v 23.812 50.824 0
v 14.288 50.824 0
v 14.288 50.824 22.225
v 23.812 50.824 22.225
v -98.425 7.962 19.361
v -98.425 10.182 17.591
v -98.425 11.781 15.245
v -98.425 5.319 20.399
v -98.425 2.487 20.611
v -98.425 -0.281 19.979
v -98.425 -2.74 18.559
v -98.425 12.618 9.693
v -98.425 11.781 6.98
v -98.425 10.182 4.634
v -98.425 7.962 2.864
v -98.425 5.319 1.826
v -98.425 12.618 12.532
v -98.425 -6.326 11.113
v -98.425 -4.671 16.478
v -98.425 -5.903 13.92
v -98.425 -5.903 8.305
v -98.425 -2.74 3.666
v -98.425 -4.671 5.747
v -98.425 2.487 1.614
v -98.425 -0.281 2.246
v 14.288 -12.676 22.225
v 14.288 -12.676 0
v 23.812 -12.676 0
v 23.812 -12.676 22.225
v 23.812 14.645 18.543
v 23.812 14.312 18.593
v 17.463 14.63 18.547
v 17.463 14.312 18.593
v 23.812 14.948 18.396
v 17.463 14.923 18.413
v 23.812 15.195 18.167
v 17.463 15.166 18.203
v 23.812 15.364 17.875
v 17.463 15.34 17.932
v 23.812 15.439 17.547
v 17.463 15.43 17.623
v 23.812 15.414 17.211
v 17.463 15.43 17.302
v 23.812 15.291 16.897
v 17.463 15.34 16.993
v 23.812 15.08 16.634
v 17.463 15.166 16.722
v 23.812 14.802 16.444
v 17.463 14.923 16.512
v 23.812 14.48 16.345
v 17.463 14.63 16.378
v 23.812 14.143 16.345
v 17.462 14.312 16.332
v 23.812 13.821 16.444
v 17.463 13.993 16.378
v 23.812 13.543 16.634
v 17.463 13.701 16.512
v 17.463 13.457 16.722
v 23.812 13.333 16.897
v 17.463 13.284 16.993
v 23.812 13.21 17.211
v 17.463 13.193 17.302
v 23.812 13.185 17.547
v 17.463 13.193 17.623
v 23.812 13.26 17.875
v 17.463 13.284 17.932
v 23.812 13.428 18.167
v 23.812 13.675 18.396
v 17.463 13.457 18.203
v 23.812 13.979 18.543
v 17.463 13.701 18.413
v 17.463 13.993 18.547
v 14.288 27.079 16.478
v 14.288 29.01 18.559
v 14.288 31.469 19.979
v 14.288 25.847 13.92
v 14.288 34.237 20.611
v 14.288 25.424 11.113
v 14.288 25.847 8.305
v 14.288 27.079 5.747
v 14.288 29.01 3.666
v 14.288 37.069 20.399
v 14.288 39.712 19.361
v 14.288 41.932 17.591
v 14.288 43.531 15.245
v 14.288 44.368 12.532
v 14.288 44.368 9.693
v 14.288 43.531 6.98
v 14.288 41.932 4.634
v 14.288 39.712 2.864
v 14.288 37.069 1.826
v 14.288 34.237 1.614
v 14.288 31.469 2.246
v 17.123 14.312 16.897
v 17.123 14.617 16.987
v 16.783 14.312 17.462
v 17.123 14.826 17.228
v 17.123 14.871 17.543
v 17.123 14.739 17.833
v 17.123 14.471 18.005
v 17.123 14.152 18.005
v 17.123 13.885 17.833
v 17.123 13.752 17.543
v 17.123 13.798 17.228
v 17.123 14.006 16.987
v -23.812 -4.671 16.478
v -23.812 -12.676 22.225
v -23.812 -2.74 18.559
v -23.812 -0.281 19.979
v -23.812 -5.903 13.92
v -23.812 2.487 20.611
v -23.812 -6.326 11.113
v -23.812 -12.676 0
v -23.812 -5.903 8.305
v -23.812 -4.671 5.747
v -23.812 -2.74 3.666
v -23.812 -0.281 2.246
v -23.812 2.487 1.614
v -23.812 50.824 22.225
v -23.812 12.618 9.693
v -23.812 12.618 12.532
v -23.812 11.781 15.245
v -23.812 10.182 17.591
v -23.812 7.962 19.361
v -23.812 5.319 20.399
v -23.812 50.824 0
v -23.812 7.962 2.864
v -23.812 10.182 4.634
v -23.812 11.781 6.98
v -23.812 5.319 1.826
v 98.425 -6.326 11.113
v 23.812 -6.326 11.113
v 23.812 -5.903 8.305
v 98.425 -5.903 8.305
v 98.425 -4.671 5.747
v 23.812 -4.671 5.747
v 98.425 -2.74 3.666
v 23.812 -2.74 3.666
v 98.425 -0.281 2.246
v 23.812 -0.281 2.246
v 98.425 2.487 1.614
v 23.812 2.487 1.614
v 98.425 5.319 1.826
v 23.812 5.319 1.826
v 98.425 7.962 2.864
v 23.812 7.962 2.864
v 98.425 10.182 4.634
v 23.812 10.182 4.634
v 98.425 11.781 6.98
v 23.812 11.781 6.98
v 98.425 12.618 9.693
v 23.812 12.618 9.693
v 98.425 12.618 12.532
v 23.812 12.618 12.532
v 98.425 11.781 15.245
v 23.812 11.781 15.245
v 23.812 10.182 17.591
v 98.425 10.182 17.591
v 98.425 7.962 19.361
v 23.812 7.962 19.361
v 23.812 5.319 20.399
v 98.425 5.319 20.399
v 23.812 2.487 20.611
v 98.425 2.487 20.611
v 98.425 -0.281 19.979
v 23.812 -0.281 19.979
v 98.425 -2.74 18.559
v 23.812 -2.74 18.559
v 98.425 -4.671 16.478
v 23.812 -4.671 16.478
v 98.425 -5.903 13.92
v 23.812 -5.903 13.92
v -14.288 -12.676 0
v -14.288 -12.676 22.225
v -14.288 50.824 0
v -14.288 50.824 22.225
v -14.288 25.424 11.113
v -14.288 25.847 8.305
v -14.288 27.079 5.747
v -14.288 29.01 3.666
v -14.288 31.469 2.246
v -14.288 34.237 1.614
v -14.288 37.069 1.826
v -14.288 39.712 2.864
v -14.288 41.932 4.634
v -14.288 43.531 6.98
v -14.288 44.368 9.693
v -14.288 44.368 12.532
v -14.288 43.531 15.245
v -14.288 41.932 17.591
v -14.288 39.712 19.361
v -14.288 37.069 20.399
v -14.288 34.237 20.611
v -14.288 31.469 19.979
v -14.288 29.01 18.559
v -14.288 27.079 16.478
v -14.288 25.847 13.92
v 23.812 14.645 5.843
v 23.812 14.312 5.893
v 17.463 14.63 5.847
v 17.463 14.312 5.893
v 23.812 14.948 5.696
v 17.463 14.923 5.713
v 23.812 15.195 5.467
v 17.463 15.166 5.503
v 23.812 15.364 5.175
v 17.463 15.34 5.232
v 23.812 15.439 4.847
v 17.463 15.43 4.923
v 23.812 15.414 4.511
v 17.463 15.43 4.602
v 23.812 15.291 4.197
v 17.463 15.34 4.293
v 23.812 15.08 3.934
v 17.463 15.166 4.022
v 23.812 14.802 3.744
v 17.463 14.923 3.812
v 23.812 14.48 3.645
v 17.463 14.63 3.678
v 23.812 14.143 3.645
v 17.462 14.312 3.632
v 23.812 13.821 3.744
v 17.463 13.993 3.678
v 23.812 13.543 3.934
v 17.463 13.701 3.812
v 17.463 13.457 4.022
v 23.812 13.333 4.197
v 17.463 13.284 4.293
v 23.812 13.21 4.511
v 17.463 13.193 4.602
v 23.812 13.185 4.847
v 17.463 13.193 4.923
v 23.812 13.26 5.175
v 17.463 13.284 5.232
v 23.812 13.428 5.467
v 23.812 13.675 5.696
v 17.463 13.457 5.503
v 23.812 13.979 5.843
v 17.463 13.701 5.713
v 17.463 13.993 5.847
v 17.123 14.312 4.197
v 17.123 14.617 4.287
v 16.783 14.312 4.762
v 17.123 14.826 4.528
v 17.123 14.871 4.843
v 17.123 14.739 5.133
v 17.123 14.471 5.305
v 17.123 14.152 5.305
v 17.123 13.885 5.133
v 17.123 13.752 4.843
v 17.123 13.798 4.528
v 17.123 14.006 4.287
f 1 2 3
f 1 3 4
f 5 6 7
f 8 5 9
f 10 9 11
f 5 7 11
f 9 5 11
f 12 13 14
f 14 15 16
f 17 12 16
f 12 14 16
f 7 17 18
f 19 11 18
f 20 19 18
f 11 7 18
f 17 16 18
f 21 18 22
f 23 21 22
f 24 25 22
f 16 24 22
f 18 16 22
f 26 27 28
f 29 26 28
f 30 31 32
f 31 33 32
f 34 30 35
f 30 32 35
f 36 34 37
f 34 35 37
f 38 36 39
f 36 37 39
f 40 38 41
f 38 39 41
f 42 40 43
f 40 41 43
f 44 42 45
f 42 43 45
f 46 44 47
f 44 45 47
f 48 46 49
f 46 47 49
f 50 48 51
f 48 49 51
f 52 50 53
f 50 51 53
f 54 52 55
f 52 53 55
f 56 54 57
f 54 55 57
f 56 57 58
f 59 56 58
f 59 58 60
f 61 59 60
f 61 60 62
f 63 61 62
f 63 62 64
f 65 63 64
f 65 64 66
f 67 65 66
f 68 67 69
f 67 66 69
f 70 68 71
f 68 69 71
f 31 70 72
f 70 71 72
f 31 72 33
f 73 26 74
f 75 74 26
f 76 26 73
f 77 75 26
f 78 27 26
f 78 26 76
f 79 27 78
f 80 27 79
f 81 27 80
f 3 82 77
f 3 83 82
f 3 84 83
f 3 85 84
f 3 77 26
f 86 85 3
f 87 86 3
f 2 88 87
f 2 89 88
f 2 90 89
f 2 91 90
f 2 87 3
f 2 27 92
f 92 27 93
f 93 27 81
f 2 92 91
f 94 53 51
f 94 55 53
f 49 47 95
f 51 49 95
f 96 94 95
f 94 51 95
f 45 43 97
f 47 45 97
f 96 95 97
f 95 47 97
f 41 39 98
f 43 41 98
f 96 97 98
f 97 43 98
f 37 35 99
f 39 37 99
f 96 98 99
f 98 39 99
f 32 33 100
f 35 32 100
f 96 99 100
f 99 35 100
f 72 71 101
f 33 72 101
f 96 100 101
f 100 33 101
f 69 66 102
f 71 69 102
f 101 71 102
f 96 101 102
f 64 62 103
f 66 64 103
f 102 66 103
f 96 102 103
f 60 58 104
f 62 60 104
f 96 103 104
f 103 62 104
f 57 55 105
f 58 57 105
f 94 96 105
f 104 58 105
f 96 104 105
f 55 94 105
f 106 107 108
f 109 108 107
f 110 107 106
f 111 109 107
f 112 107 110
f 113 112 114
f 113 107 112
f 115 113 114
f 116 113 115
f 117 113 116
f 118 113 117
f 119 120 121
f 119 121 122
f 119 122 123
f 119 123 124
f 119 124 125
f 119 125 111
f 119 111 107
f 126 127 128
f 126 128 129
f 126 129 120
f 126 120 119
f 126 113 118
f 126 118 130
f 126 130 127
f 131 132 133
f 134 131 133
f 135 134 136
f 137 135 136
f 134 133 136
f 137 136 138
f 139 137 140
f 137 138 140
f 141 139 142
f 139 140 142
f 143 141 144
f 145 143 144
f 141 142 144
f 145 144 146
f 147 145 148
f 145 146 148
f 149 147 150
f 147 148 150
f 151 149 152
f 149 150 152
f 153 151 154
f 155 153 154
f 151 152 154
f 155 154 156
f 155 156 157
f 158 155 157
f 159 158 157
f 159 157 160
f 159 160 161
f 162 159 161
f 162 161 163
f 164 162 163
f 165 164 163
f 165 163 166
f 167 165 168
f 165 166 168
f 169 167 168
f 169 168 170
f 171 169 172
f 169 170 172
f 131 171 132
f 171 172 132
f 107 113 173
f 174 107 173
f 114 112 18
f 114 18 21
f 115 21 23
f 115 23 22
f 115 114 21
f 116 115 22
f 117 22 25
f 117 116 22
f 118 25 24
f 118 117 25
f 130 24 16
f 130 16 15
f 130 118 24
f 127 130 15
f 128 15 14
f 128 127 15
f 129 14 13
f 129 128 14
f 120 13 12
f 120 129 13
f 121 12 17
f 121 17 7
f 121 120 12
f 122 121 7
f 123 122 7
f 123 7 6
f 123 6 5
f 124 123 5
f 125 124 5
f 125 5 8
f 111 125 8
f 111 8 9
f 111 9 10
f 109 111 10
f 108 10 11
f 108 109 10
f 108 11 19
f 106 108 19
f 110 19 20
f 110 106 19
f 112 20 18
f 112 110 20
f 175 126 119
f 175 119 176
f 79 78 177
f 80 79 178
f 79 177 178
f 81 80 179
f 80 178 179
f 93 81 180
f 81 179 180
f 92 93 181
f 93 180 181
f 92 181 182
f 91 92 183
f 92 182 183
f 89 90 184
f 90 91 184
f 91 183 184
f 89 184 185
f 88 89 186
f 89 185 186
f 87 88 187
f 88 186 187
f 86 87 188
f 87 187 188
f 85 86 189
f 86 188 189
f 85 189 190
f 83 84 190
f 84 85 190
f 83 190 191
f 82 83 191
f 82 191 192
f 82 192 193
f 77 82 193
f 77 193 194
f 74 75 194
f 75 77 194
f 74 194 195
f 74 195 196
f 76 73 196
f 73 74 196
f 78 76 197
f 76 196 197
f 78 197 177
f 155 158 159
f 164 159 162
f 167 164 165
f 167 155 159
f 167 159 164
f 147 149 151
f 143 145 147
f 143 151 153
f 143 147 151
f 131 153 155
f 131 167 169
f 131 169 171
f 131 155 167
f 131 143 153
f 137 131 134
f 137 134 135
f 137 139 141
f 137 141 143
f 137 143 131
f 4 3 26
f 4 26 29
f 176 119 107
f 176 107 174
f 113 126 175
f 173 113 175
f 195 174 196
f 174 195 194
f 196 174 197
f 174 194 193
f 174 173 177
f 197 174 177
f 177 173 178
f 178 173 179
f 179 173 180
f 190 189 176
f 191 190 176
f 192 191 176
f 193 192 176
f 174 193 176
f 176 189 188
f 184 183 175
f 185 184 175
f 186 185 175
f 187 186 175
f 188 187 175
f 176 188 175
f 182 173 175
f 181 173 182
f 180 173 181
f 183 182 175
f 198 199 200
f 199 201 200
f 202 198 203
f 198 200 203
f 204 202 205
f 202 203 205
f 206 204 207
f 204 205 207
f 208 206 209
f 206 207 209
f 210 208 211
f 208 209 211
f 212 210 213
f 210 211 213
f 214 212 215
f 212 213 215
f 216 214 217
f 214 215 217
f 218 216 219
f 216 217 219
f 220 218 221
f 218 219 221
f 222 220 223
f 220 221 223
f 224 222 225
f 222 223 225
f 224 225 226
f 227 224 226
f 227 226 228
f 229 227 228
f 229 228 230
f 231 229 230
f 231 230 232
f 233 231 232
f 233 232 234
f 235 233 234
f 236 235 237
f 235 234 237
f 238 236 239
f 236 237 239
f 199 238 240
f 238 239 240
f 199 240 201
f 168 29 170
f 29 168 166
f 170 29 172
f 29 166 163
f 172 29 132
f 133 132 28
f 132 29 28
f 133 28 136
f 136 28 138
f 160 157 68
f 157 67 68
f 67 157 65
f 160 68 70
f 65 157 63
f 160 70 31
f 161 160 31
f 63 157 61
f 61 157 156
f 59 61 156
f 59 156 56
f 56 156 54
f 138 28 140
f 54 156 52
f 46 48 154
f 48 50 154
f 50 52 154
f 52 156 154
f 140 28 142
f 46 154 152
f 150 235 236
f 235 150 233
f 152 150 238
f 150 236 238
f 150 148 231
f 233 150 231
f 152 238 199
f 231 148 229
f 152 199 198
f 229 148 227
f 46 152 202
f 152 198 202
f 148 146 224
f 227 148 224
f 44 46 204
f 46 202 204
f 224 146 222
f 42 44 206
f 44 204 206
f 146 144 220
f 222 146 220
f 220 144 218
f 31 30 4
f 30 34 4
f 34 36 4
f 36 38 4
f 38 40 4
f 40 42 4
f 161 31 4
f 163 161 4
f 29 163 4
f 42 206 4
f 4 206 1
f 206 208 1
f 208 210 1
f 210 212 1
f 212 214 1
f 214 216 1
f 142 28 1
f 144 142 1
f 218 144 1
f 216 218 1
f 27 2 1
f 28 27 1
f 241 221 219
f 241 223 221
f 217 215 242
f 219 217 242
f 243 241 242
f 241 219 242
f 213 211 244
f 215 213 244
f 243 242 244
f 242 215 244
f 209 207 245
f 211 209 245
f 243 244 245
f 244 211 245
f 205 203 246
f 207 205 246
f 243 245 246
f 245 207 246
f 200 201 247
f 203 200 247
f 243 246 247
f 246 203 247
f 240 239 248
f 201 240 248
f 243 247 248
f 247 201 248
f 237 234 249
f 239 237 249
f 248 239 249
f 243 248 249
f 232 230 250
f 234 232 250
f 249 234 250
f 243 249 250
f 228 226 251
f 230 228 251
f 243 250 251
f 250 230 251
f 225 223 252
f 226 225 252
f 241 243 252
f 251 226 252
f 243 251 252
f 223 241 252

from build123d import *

# Parameters (mm, degrees)
SKETCH2_W                       = 9.525
SKETCH2_H                       = 63.5
BOSS_EXTRUDE1_DEPTH             = 22.225
BOSS_EXTRUDE1_2_DEPTH           = 22.225
BOSS_EXTRUDE3_REACH             = 69.295
SKETCH3_R                       = 9.525
SKETCH4_R                       = 9.525
BOSS_EXTRUDE4_DEPTH             = 74.6125
F_43_0_089_DIAMETER_HOLE1_D     = 2.2606
F_43_0_089_DIAMETER_HOLE1_DEPTH = 6.35
F_43_0_089_DIAMETER_HOLE1_TIP   = 0.679152758


with BuildPart() as part:
    # Sketch2 → Boss-Extrude1 (new body)
    with BuildSketch(Plane.XY):
        with Locations((-19.05, 19.074189237)):
            Rectangle(SKETCH2_W, SKETCH2_H)
    extrude(amount=BOSS_EXTRUDE1_DEPTH)


with BuildPart() as body_2:
    # Sketch2 → Boss-Extrude1 2 (new body)
    with BuildSketch(Plane.XY):
        with Locations((19.05, 19.074189237)):
            Rectangle(SKETCH2_W, SKETCH2_H)
    extrude(amount=BOSS_EXTRUDE1_2_DEPTH)

    # Sketch3 → Boss-Extrude3 (add, up to next)
    with BuildSketch(Plane(origin=(-14.2875, 0, 0), x_dir=(0, 0, -1), z_dir=(1, 0, 0)), mode=Mode.PRIVATE) as boss_extrude3_sk1:
        with Locations(Location((-11.1125, 34.949189237, 0), (0, 0, 270))):
            Circle(SKETCH3_R)
    boss_extrude3_tool1 = extrude(boss_extrude3_sk1.sketch, amount=BOSS_EXTRUDE3_REACH, mode=Mode.PRIVATE) - body_2.part

    add(part.part)  # Boss-Extrude3 merges part
    add(boss_extrude3_tool1.solids().sort_by_distance((-14.2875, 34.949189, 11.1125))[0])

    # Sketch4 → Boss-Extrude4 (add)
    with BuildSketch(Plane(origin=(23.8125, 0, 0), x_dir=(0, 0, -1), z_dir=(1, 0, 0))):
        with Locations(Location((-11.1125, 3.199189237, 0), (0, 0, 270))):
            Circle(SKETCH4_R)
    boss_extrude4 = extrude(amount=BOSS_EXTRUDE4_DEPTH)

    # Mirror1: Boss-Extrude4 across plane
    add(boss_extrude4.mirror(Plane(origin=(0, 0, 0), x_dir=(0, 0, 1), z_dir=(1, 0, 0))))

    # #43 (0.089) Diameter Hole1
    with Locations(Plane(origin=(23.8125, 0, 0), x_dir=(0, 0, -1), z_dir=(1, 0, 0))):
        with Locations((-17.4625, 14.311689237), (-4.7625, 14.311689237)):
            Hole(F_43_0_089_DIAMETER_HOLE1_D / 2, depth=F_43_0_089_DIAMETER_HOLE1_DEPTH)
            with Locations((0, 0, -(F_43_0_089_DIAMETER_HOLE1_DEPTH + F_43_0_089_DIAMETER_HOLE1_TIP / 2))):  # 118° drill point
                Cone(0, F_43_0_089_DIAMETER_HOLE1_D / 2, F_43_0_089_DIAMETER_HOLE1_TIP, mode=Mode.SUBTRACT)


solid = body_2.part
